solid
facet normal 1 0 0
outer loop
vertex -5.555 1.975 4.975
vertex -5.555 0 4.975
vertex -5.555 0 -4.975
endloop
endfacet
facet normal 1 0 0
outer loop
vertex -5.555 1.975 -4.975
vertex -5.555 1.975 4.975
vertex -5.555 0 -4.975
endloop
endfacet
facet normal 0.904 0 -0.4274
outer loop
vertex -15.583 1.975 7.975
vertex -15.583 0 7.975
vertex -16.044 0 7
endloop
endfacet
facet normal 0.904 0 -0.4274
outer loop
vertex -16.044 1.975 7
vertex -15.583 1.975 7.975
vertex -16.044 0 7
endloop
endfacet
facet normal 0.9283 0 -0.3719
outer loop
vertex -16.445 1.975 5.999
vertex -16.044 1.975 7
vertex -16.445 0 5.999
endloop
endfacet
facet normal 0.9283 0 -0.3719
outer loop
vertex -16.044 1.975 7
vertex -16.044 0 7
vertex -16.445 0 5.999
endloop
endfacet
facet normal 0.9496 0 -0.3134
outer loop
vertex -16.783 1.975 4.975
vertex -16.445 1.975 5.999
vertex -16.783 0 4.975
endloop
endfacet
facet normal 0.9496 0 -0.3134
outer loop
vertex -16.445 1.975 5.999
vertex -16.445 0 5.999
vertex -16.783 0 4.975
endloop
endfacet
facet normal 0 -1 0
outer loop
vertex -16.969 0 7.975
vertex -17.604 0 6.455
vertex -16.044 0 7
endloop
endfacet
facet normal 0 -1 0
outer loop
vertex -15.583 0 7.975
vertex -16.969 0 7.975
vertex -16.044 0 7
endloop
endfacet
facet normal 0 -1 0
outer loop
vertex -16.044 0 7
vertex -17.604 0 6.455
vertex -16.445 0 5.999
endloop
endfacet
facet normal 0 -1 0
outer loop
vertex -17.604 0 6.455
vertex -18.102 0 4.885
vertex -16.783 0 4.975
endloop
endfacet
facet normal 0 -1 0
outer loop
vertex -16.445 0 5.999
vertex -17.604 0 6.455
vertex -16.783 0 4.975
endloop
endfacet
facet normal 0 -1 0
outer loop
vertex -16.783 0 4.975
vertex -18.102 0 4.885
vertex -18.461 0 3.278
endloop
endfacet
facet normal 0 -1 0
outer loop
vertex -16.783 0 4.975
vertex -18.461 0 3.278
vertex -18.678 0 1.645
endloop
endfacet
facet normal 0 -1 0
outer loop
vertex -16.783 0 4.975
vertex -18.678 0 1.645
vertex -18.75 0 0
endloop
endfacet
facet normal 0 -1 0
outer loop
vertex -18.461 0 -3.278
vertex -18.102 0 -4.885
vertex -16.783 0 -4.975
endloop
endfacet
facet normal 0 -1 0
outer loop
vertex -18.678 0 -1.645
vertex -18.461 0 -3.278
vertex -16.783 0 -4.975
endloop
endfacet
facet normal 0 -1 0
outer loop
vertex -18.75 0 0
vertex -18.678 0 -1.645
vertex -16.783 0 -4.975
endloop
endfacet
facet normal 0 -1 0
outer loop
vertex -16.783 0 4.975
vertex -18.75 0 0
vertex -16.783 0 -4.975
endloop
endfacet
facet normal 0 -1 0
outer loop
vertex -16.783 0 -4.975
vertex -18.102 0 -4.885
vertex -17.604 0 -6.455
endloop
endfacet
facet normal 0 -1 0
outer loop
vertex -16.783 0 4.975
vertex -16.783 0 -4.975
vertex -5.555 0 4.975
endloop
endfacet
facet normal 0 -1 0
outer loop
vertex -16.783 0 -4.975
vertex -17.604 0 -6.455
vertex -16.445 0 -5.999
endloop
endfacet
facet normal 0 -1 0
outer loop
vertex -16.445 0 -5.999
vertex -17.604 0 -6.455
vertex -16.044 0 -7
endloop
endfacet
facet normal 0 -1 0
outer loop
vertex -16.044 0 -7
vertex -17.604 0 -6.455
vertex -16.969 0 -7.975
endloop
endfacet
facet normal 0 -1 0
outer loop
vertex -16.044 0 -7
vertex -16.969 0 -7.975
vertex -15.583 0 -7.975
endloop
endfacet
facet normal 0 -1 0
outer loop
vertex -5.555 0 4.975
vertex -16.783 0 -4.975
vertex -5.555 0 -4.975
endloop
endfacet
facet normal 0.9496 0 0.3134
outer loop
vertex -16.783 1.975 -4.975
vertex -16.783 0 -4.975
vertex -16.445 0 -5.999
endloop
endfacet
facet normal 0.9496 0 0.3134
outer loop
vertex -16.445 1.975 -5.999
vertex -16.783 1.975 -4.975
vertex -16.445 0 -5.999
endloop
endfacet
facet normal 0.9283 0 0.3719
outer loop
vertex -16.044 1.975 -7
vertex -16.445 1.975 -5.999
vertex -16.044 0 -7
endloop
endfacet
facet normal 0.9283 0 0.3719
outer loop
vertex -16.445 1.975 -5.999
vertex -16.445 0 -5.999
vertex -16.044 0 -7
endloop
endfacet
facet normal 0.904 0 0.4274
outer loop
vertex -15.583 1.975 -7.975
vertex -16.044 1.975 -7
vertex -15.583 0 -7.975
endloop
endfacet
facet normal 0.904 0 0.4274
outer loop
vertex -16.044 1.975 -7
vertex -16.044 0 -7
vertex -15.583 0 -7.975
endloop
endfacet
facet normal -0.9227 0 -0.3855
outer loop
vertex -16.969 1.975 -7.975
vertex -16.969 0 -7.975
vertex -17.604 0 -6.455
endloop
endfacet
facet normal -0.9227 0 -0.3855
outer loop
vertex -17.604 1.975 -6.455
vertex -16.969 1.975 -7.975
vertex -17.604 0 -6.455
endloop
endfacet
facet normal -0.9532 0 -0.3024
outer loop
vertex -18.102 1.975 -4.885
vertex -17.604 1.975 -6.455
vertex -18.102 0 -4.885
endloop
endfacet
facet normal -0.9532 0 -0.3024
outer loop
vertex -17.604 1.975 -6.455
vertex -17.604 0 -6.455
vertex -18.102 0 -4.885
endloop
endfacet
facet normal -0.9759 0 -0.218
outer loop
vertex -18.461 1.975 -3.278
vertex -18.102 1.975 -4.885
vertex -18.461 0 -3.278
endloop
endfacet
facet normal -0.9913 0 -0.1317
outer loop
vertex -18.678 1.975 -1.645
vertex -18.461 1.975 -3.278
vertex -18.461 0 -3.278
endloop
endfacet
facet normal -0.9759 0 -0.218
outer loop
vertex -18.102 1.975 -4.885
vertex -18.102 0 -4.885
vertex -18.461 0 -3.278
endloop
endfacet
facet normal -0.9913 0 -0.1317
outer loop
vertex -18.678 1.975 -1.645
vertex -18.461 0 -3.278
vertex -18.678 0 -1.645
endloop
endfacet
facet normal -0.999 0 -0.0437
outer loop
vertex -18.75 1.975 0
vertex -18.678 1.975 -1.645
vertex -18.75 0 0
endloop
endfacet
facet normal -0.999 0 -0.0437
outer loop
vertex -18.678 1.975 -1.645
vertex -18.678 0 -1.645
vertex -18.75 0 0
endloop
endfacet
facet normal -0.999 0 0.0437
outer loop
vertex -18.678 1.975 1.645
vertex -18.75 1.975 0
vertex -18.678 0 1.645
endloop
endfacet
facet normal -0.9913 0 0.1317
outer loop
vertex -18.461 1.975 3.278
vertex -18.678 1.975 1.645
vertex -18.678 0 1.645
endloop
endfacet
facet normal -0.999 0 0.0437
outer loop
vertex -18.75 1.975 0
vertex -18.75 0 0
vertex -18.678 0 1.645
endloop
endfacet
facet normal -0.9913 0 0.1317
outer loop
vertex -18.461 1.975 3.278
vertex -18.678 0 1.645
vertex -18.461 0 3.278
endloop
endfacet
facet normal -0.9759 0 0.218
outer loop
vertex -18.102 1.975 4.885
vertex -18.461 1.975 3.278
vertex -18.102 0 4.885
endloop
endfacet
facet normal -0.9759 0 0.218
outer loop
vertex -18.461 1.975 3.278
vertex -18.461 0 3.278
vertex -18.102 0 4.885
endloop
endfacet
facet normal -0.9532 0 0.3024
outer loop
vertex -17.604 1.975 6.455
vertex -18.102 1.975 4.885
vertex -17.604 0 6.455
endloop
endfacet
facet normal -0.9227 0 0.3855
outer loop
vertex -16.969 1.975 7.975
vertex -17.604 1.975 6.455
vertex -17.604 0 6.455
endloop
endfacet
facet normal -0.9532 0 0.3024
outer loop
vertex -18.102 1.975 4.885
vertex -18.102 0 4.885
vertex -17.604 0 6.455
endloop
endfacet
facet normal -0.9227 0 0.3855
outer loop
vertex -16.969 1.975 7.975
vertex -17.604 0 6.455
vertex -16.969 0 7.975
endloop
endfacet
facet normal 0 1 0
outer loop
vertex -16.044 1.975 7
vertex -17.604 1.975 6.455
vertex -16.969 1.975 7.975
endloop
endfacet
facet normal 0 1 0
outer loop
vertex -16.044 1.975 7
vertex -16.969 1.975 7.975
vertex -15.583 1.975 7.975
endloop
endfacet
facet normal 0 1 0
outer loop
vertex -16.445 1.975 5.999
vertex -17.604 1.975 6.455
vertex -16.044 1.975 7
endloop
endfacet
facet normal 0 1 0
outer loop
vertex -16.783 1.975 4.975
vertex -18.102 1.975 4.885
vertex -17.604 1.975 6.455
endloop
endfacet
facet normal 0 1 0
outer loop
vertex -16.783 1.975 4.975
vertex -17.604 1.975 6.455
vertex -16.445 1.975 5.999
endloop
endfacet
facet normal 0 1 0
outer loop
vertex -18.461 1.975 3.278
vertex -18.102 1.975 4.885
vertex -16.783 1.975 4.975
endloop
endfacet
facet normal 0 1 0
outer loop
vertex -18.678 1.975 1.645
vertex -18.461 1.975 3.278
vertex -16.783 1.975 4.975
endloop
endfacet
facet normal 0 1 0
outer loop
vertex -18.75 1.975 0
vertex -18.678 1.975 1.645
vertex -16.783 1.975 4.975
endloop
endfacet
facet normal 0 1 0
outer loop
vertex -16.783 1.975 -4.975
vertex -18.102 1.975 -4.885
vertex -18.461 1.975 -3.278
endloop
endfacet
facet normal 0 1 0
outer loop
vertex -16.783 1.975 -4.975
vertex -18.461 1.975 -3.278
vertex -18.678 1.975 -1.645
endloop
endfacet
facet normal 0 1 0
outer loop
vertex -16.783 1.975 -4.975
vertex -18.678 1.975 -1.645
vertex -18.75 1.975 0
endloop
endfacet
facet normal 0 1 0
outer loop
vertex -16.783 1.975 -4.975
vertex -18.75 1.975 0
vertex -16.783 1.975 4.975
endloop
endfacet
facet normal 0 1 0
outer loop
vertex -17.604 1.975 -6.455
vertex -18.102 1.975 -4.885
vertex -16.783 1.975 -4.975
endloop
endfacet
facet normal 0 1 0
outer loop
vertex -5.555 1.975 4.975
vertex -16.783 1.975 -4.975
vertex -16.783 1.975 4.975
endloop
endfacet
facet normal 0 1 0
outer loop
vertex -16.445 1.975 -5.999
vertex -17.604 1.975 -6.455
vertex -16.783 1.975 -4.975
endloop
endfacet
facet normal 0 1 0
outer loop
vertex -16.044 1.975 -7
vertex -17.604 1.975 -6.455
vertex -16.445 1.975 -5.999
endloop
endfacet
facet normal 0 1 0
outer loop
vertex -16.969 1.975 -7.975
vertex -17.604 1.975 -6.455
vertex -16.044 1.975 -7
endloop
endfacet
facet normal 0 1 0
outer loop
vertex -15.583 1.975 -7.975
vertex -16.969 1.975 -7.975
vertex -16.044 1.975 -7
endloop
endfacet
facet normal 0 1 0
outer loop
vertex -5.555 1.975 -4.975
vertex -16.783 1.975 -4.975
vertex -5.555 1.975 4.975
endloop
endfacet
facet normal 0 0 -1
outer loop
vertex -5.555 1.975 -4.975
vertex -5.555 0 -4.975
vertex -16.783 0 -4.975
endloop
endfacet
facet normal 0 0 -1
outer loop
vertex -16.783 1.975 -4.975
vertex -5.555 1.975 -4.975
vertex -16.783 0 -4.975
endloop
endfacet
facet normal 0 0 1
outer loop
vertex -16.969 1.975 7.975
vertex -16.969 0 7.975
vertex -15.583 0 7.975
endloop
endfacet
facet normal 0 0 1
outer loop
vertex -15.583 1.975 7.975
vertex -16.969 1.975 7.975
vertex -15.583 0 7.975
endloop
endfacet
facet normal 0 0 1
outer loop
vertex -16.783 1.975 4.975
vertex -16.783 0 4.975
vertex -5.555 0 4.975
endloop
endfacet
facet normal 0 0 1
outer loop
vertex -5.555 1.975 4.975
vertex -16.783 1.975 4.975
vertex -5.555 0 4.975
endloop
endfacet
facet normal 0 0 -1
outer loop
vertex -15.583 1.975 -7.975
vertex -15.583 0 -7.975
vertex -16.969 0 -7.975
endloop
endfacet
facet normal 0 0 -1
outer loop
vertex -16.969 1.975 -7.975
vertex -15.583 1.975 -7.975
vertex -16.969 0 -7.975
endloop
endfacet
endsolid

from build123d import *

# Parameters (mm, degrees)
BOSS_EXTRUDE2_DEPTH = 1.975


with BuildPart() as part:
    # Sketch1 → Boss-Extrude2 (new body)
    with BuildSketch(Plane(origin=(0, 0, 0), x_dir=(1, 0, 0), z_dir=(0, 1, 0))):
        with BuildLine():
            ThreePointArc((-16.969439443, 7.975), (-18.75, 0), (-16.969439443, -7.975))
            Line((-16.969439443, -7.975), (-15.582823878, -7.975))
            ThreePointArc((-15.582823878, -7.975), (-16.252359809, -6.502755234), (-16.783158225, -4.975))
            Line((-16.783158225, -4.975), (-5.555, -4.975))
            Line((-5.555, -4.975), (-5.555, 4.975))
            Line((-5.555, 4.975), (-16.783158225, 4.975))
            ThreePointArc((-16.783158225, 4.975), (-16.252359809, 6.502755234), (-15.582823878, 7.975))
            Line((-15.582823878, 7.975), (-16.969439443, 7.975))
        make_face()
    extrude(amount=BOSS_EXTRUDE2_DEPTH)


solid = part.part
